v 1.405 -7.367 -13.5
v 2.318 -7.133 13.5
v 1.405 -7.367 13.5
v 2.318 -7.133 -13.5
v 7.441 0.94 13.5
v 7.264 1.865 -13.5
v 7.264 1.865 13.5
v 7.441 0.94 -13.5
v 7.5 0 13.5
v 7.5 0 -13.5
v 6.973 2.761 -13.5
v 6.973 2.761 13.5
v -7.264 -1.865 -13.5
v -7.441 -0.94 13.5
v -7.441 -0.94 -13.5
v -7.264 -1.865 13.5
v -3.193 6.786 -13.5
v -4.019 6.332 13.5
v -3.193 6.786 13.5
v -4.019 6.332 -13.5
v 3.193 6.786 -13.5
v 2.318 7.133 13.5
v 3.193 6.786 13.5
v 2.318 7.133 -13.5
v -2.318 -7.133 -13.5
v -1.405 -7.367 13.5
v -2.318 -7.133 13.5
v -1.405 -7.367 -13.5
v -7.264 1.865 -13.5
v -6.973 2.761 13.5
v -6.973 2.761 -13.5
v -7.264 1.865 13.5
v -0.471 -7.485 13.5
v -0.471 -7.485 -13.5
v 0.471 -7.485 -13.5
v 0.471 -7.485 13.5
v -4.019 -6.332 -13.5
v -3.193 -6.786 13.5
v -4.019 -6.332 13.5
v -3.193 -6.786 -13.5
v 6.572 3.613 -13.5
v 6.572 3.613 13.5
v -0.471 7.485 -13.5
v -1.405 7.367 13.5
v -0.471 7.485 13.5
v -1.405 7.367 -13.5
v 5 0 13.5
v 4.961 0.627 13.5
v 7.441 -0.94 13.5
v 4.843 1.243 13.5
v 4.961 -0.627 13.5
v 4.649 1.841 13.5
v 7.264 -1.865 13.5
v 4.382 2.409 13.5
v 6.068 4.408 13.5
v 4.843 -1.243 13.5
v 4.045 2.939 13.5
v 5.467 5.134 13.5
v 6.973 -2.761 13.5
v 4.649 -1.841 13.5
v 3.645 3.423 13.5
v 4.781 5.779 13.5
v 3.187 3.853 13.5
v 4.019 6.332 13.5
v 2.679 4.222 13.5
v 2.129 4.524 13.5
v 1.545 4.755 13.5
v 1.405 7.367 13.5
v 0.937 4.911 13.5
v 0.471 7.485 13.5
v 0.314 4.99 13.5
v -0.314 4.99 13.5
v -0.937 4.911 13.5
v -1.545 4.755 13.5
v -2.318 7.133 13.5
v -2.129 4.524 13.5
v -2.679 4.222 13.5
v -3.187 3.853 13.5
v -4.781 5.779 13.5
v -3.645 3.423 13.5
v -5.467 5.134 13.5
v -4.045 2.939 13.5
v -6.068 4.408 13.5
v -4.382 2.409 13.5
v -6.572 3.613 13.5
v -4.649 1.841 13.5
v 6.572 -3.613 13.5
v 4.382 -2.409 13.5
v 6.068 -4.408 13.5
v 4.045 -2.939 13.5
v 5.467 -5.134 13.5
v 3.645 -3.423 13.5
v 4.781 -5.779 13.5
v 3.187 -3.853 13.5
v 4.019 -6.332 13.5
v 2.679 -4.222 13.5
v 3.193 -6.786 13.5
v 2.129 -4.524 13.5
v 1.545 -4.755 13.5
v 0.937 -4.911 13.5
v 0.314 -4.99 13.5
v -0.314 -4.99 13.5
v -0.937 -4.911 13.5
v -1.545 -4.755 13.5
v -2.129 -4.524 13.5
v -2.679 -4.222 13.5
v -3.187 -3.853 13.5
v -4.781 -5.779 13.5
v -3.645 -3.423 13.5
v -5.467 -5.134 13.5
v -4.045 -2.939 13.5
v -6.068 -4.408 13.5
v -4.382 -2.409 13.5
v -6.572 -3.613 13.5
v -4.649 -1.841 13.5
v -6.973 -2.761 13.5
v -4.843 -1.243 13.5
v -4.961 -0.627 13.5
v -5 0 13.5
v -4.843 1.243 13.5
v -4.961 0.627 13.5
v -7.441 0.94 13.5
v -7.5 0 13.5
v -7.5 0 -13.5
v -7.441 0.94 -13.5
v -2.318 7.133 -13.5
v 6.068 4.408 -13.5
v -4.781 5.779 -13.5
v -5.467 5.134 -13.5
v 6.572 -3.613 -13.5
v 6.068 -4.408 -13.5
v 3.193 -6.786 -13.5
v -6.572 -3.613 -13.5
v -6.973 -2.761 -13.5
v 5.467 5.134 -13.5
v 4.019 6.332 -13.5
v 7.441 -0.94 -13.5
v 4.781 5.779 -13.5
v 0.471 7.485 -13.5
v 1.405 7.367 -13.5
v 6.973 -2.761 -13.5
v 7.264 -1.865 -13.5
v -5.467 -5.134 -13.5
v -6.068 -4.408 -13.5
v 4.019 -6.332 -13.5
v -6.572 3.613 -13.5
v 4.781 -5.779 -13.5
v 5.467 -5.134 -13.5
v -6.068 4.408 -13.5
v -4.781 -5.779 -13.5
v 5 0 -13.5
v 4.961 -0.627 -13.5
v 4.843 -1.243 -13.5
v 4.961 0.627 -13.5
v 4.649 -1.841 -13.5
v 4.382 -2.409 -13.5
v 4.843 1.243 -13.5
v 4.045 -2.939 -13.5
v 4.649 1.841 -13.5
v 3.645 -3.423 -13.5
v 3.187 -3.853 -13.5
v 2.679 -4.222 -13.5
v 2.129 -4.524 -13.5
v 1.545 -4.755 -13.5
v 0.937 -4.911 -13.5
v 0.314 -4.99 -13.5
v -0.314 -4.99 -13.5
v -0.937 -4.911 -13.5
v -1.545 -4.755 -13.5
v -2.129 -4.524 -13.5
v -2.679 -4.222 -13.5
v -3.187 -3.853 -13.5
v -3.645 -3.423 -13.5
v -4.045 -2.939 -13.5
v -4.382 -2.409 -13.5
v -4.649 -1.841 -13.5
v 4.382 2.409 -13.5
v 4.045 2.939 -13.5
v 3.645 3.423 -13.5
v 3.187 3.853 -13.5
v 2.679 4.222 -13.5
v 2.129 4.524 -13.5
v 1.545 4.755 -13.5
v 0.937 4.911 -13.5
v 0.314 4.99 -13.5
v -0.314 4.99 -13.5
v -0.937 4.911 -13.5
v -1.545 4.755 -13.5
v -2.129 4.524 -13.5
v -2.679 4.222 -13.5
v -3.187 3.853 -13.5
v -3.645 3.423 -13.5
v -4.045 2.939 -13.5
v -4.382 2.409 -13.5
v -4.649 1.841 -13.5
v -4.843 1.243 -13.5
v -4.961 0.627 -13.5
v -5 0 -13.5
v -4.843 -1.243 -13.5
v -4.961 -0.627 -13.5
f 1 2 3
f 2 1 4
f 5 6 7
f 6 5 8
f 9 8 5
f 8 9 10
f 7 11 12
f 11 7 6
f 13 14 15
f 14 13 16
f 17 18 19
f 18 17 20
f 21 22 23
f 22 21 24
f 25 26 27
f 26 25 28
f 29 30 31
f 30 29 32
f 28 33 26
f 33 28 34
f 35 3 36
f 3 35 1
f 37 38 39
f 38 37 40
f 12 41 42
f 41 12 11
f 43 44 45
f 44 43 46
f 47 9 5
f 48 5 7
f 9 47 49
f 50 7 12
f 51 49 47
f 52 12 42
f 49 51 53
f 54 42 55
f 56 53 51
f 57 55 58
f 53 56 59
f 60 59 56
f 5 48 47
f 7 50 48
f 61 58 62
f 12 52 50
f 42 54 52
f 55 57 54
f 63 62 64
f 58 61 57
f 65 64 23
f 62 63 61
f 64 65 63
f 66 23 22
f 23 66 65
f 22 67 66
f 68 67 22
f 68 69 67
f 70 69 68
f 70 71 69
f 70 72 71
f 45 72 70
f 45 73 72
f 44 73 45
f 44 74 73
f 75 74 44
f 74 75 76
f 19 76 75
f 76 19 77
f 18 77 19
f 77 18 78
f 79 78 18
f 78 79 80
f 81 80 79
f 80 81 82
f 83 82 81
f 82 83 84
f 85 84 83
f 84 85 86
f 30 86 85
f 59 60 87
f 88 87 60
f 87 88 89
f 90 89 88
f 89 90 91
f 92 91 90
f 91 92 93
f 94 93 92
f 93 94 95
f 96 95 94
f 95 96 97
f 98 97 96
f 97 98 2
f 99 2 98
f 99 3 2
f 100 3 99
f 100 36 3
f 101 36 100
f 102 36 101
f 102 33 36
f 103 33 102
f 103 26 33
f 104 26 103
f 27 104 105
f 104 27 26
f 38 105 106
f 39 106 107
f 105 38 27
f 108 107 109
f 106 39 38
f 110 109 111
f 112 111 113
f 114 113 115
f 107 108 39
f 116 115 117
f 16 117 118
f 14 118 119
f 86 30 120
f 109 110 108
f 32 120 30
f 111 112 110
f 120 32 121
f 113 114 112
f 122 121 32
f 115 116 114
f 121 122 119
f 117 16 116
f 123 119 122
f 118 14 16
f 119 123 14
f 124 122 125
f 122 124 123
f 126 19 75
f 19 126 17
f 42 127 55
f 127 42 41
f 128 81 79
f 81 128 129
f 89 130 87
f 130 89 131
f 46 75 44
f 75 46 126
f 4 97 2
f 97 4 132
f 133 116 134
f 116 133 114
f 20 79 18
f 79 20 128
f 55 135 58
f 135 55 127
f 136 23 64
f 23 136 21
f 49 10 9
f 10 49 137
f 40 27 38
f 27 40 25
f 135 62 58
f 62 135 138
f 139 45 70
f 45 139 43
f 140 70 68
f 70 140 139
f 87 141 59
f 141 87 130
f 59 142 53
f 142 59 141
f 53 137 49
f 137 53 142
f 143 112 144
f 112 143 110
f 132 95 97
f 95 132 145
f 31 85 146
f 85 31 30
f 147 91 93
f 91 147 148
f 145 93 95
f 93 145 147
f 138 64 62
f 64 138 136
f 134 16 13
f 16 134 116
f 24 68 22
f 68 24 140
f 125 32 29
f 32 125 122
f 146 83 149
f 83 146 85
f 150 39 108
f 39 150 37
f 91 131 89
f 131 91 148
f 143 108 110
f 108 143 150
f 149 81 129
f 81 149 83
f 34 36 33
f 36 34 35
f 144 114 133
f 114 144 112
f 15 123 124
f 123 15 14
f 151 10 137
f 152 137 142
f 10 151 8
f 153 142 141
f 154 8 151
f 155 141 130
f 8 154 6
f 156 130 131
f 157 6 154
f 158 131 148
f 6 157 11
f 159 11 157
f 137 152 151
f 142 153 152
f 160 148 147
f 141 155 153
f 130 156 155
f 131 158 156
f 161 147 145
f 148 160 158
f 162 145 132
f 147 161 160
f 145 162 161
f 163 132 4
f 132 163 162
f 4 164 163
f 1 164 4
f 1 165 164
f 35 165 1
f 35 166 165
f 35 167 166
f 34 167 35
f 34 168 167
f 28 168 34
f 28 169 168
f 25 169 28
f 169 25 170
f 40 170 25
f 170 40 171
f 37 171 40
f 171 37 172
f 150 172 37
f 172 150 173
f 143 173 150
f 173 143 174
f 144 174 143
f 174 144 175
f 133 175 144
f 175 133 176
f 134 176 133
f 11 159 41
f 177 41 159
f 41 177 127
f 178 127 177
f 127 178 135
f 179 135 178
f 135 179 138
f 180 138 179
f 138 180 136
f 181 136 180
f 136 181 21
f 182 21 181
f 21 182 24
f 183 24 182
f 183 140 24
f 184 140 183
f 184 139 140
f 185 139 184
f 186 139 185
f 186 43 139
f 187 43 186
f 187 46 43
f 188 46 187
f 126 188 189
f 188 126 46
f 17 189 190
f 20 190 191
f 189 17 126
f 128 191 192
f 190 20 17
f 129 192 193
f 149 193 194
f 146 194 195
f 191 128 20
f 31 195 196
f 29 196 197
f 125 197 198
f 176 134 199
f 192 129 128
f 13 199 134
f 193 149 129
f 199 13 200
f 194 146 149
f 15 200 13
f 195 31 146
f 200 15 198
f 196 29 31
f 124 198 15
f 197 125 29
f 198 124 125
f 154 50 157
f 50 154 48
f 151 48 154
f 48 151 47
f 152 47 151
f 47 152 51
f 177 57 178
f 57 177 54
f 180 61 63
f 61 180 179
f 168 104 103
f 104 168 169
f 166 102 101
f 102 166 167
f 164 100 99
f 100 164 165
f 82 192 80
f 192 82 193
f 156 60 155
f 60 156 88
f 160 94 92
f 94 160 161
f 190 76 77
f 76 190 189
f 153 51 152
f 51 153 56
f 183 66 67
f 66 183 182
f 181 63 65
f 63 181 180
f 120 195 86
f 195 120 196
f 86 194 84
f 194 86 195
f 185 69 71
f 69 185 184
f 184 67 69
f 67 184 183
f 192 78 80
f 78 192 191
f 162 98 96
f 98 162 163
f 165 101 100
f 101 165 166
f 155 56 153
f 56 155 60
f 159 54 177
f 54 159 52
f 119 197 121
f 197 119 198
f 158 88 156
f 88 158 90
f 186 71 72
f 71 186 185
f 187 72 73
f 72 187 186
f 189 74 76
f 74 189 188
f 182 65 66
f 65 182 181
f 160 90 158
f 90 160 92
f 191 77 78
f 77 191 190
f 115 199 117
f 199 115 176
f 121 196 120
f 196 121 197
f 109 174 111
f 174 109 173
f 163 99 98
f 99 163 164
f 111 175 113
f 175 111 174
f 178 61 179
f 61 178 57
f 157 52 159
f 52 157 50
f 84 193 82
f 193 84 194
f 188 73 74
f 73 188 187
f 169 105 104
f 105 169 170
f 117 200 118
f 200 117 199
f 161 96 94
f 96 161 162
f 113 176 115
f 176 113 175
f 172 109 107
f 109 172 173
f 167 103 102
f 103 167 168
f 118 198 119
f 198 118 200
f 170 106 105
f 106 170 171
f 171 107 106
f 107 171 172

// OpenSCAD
$fn = 50;


difference() {
	union() {
		translate(v = [0, 0, -13.5000000000]) {
			cylinder(h = 27, r = 7.5000000000);
		}
	}
	union() {
		translate(v = [0, 0, -100.0000000000]) {
			cylinder(h = 200, r = 5.0000000000);
		}
	}
}
